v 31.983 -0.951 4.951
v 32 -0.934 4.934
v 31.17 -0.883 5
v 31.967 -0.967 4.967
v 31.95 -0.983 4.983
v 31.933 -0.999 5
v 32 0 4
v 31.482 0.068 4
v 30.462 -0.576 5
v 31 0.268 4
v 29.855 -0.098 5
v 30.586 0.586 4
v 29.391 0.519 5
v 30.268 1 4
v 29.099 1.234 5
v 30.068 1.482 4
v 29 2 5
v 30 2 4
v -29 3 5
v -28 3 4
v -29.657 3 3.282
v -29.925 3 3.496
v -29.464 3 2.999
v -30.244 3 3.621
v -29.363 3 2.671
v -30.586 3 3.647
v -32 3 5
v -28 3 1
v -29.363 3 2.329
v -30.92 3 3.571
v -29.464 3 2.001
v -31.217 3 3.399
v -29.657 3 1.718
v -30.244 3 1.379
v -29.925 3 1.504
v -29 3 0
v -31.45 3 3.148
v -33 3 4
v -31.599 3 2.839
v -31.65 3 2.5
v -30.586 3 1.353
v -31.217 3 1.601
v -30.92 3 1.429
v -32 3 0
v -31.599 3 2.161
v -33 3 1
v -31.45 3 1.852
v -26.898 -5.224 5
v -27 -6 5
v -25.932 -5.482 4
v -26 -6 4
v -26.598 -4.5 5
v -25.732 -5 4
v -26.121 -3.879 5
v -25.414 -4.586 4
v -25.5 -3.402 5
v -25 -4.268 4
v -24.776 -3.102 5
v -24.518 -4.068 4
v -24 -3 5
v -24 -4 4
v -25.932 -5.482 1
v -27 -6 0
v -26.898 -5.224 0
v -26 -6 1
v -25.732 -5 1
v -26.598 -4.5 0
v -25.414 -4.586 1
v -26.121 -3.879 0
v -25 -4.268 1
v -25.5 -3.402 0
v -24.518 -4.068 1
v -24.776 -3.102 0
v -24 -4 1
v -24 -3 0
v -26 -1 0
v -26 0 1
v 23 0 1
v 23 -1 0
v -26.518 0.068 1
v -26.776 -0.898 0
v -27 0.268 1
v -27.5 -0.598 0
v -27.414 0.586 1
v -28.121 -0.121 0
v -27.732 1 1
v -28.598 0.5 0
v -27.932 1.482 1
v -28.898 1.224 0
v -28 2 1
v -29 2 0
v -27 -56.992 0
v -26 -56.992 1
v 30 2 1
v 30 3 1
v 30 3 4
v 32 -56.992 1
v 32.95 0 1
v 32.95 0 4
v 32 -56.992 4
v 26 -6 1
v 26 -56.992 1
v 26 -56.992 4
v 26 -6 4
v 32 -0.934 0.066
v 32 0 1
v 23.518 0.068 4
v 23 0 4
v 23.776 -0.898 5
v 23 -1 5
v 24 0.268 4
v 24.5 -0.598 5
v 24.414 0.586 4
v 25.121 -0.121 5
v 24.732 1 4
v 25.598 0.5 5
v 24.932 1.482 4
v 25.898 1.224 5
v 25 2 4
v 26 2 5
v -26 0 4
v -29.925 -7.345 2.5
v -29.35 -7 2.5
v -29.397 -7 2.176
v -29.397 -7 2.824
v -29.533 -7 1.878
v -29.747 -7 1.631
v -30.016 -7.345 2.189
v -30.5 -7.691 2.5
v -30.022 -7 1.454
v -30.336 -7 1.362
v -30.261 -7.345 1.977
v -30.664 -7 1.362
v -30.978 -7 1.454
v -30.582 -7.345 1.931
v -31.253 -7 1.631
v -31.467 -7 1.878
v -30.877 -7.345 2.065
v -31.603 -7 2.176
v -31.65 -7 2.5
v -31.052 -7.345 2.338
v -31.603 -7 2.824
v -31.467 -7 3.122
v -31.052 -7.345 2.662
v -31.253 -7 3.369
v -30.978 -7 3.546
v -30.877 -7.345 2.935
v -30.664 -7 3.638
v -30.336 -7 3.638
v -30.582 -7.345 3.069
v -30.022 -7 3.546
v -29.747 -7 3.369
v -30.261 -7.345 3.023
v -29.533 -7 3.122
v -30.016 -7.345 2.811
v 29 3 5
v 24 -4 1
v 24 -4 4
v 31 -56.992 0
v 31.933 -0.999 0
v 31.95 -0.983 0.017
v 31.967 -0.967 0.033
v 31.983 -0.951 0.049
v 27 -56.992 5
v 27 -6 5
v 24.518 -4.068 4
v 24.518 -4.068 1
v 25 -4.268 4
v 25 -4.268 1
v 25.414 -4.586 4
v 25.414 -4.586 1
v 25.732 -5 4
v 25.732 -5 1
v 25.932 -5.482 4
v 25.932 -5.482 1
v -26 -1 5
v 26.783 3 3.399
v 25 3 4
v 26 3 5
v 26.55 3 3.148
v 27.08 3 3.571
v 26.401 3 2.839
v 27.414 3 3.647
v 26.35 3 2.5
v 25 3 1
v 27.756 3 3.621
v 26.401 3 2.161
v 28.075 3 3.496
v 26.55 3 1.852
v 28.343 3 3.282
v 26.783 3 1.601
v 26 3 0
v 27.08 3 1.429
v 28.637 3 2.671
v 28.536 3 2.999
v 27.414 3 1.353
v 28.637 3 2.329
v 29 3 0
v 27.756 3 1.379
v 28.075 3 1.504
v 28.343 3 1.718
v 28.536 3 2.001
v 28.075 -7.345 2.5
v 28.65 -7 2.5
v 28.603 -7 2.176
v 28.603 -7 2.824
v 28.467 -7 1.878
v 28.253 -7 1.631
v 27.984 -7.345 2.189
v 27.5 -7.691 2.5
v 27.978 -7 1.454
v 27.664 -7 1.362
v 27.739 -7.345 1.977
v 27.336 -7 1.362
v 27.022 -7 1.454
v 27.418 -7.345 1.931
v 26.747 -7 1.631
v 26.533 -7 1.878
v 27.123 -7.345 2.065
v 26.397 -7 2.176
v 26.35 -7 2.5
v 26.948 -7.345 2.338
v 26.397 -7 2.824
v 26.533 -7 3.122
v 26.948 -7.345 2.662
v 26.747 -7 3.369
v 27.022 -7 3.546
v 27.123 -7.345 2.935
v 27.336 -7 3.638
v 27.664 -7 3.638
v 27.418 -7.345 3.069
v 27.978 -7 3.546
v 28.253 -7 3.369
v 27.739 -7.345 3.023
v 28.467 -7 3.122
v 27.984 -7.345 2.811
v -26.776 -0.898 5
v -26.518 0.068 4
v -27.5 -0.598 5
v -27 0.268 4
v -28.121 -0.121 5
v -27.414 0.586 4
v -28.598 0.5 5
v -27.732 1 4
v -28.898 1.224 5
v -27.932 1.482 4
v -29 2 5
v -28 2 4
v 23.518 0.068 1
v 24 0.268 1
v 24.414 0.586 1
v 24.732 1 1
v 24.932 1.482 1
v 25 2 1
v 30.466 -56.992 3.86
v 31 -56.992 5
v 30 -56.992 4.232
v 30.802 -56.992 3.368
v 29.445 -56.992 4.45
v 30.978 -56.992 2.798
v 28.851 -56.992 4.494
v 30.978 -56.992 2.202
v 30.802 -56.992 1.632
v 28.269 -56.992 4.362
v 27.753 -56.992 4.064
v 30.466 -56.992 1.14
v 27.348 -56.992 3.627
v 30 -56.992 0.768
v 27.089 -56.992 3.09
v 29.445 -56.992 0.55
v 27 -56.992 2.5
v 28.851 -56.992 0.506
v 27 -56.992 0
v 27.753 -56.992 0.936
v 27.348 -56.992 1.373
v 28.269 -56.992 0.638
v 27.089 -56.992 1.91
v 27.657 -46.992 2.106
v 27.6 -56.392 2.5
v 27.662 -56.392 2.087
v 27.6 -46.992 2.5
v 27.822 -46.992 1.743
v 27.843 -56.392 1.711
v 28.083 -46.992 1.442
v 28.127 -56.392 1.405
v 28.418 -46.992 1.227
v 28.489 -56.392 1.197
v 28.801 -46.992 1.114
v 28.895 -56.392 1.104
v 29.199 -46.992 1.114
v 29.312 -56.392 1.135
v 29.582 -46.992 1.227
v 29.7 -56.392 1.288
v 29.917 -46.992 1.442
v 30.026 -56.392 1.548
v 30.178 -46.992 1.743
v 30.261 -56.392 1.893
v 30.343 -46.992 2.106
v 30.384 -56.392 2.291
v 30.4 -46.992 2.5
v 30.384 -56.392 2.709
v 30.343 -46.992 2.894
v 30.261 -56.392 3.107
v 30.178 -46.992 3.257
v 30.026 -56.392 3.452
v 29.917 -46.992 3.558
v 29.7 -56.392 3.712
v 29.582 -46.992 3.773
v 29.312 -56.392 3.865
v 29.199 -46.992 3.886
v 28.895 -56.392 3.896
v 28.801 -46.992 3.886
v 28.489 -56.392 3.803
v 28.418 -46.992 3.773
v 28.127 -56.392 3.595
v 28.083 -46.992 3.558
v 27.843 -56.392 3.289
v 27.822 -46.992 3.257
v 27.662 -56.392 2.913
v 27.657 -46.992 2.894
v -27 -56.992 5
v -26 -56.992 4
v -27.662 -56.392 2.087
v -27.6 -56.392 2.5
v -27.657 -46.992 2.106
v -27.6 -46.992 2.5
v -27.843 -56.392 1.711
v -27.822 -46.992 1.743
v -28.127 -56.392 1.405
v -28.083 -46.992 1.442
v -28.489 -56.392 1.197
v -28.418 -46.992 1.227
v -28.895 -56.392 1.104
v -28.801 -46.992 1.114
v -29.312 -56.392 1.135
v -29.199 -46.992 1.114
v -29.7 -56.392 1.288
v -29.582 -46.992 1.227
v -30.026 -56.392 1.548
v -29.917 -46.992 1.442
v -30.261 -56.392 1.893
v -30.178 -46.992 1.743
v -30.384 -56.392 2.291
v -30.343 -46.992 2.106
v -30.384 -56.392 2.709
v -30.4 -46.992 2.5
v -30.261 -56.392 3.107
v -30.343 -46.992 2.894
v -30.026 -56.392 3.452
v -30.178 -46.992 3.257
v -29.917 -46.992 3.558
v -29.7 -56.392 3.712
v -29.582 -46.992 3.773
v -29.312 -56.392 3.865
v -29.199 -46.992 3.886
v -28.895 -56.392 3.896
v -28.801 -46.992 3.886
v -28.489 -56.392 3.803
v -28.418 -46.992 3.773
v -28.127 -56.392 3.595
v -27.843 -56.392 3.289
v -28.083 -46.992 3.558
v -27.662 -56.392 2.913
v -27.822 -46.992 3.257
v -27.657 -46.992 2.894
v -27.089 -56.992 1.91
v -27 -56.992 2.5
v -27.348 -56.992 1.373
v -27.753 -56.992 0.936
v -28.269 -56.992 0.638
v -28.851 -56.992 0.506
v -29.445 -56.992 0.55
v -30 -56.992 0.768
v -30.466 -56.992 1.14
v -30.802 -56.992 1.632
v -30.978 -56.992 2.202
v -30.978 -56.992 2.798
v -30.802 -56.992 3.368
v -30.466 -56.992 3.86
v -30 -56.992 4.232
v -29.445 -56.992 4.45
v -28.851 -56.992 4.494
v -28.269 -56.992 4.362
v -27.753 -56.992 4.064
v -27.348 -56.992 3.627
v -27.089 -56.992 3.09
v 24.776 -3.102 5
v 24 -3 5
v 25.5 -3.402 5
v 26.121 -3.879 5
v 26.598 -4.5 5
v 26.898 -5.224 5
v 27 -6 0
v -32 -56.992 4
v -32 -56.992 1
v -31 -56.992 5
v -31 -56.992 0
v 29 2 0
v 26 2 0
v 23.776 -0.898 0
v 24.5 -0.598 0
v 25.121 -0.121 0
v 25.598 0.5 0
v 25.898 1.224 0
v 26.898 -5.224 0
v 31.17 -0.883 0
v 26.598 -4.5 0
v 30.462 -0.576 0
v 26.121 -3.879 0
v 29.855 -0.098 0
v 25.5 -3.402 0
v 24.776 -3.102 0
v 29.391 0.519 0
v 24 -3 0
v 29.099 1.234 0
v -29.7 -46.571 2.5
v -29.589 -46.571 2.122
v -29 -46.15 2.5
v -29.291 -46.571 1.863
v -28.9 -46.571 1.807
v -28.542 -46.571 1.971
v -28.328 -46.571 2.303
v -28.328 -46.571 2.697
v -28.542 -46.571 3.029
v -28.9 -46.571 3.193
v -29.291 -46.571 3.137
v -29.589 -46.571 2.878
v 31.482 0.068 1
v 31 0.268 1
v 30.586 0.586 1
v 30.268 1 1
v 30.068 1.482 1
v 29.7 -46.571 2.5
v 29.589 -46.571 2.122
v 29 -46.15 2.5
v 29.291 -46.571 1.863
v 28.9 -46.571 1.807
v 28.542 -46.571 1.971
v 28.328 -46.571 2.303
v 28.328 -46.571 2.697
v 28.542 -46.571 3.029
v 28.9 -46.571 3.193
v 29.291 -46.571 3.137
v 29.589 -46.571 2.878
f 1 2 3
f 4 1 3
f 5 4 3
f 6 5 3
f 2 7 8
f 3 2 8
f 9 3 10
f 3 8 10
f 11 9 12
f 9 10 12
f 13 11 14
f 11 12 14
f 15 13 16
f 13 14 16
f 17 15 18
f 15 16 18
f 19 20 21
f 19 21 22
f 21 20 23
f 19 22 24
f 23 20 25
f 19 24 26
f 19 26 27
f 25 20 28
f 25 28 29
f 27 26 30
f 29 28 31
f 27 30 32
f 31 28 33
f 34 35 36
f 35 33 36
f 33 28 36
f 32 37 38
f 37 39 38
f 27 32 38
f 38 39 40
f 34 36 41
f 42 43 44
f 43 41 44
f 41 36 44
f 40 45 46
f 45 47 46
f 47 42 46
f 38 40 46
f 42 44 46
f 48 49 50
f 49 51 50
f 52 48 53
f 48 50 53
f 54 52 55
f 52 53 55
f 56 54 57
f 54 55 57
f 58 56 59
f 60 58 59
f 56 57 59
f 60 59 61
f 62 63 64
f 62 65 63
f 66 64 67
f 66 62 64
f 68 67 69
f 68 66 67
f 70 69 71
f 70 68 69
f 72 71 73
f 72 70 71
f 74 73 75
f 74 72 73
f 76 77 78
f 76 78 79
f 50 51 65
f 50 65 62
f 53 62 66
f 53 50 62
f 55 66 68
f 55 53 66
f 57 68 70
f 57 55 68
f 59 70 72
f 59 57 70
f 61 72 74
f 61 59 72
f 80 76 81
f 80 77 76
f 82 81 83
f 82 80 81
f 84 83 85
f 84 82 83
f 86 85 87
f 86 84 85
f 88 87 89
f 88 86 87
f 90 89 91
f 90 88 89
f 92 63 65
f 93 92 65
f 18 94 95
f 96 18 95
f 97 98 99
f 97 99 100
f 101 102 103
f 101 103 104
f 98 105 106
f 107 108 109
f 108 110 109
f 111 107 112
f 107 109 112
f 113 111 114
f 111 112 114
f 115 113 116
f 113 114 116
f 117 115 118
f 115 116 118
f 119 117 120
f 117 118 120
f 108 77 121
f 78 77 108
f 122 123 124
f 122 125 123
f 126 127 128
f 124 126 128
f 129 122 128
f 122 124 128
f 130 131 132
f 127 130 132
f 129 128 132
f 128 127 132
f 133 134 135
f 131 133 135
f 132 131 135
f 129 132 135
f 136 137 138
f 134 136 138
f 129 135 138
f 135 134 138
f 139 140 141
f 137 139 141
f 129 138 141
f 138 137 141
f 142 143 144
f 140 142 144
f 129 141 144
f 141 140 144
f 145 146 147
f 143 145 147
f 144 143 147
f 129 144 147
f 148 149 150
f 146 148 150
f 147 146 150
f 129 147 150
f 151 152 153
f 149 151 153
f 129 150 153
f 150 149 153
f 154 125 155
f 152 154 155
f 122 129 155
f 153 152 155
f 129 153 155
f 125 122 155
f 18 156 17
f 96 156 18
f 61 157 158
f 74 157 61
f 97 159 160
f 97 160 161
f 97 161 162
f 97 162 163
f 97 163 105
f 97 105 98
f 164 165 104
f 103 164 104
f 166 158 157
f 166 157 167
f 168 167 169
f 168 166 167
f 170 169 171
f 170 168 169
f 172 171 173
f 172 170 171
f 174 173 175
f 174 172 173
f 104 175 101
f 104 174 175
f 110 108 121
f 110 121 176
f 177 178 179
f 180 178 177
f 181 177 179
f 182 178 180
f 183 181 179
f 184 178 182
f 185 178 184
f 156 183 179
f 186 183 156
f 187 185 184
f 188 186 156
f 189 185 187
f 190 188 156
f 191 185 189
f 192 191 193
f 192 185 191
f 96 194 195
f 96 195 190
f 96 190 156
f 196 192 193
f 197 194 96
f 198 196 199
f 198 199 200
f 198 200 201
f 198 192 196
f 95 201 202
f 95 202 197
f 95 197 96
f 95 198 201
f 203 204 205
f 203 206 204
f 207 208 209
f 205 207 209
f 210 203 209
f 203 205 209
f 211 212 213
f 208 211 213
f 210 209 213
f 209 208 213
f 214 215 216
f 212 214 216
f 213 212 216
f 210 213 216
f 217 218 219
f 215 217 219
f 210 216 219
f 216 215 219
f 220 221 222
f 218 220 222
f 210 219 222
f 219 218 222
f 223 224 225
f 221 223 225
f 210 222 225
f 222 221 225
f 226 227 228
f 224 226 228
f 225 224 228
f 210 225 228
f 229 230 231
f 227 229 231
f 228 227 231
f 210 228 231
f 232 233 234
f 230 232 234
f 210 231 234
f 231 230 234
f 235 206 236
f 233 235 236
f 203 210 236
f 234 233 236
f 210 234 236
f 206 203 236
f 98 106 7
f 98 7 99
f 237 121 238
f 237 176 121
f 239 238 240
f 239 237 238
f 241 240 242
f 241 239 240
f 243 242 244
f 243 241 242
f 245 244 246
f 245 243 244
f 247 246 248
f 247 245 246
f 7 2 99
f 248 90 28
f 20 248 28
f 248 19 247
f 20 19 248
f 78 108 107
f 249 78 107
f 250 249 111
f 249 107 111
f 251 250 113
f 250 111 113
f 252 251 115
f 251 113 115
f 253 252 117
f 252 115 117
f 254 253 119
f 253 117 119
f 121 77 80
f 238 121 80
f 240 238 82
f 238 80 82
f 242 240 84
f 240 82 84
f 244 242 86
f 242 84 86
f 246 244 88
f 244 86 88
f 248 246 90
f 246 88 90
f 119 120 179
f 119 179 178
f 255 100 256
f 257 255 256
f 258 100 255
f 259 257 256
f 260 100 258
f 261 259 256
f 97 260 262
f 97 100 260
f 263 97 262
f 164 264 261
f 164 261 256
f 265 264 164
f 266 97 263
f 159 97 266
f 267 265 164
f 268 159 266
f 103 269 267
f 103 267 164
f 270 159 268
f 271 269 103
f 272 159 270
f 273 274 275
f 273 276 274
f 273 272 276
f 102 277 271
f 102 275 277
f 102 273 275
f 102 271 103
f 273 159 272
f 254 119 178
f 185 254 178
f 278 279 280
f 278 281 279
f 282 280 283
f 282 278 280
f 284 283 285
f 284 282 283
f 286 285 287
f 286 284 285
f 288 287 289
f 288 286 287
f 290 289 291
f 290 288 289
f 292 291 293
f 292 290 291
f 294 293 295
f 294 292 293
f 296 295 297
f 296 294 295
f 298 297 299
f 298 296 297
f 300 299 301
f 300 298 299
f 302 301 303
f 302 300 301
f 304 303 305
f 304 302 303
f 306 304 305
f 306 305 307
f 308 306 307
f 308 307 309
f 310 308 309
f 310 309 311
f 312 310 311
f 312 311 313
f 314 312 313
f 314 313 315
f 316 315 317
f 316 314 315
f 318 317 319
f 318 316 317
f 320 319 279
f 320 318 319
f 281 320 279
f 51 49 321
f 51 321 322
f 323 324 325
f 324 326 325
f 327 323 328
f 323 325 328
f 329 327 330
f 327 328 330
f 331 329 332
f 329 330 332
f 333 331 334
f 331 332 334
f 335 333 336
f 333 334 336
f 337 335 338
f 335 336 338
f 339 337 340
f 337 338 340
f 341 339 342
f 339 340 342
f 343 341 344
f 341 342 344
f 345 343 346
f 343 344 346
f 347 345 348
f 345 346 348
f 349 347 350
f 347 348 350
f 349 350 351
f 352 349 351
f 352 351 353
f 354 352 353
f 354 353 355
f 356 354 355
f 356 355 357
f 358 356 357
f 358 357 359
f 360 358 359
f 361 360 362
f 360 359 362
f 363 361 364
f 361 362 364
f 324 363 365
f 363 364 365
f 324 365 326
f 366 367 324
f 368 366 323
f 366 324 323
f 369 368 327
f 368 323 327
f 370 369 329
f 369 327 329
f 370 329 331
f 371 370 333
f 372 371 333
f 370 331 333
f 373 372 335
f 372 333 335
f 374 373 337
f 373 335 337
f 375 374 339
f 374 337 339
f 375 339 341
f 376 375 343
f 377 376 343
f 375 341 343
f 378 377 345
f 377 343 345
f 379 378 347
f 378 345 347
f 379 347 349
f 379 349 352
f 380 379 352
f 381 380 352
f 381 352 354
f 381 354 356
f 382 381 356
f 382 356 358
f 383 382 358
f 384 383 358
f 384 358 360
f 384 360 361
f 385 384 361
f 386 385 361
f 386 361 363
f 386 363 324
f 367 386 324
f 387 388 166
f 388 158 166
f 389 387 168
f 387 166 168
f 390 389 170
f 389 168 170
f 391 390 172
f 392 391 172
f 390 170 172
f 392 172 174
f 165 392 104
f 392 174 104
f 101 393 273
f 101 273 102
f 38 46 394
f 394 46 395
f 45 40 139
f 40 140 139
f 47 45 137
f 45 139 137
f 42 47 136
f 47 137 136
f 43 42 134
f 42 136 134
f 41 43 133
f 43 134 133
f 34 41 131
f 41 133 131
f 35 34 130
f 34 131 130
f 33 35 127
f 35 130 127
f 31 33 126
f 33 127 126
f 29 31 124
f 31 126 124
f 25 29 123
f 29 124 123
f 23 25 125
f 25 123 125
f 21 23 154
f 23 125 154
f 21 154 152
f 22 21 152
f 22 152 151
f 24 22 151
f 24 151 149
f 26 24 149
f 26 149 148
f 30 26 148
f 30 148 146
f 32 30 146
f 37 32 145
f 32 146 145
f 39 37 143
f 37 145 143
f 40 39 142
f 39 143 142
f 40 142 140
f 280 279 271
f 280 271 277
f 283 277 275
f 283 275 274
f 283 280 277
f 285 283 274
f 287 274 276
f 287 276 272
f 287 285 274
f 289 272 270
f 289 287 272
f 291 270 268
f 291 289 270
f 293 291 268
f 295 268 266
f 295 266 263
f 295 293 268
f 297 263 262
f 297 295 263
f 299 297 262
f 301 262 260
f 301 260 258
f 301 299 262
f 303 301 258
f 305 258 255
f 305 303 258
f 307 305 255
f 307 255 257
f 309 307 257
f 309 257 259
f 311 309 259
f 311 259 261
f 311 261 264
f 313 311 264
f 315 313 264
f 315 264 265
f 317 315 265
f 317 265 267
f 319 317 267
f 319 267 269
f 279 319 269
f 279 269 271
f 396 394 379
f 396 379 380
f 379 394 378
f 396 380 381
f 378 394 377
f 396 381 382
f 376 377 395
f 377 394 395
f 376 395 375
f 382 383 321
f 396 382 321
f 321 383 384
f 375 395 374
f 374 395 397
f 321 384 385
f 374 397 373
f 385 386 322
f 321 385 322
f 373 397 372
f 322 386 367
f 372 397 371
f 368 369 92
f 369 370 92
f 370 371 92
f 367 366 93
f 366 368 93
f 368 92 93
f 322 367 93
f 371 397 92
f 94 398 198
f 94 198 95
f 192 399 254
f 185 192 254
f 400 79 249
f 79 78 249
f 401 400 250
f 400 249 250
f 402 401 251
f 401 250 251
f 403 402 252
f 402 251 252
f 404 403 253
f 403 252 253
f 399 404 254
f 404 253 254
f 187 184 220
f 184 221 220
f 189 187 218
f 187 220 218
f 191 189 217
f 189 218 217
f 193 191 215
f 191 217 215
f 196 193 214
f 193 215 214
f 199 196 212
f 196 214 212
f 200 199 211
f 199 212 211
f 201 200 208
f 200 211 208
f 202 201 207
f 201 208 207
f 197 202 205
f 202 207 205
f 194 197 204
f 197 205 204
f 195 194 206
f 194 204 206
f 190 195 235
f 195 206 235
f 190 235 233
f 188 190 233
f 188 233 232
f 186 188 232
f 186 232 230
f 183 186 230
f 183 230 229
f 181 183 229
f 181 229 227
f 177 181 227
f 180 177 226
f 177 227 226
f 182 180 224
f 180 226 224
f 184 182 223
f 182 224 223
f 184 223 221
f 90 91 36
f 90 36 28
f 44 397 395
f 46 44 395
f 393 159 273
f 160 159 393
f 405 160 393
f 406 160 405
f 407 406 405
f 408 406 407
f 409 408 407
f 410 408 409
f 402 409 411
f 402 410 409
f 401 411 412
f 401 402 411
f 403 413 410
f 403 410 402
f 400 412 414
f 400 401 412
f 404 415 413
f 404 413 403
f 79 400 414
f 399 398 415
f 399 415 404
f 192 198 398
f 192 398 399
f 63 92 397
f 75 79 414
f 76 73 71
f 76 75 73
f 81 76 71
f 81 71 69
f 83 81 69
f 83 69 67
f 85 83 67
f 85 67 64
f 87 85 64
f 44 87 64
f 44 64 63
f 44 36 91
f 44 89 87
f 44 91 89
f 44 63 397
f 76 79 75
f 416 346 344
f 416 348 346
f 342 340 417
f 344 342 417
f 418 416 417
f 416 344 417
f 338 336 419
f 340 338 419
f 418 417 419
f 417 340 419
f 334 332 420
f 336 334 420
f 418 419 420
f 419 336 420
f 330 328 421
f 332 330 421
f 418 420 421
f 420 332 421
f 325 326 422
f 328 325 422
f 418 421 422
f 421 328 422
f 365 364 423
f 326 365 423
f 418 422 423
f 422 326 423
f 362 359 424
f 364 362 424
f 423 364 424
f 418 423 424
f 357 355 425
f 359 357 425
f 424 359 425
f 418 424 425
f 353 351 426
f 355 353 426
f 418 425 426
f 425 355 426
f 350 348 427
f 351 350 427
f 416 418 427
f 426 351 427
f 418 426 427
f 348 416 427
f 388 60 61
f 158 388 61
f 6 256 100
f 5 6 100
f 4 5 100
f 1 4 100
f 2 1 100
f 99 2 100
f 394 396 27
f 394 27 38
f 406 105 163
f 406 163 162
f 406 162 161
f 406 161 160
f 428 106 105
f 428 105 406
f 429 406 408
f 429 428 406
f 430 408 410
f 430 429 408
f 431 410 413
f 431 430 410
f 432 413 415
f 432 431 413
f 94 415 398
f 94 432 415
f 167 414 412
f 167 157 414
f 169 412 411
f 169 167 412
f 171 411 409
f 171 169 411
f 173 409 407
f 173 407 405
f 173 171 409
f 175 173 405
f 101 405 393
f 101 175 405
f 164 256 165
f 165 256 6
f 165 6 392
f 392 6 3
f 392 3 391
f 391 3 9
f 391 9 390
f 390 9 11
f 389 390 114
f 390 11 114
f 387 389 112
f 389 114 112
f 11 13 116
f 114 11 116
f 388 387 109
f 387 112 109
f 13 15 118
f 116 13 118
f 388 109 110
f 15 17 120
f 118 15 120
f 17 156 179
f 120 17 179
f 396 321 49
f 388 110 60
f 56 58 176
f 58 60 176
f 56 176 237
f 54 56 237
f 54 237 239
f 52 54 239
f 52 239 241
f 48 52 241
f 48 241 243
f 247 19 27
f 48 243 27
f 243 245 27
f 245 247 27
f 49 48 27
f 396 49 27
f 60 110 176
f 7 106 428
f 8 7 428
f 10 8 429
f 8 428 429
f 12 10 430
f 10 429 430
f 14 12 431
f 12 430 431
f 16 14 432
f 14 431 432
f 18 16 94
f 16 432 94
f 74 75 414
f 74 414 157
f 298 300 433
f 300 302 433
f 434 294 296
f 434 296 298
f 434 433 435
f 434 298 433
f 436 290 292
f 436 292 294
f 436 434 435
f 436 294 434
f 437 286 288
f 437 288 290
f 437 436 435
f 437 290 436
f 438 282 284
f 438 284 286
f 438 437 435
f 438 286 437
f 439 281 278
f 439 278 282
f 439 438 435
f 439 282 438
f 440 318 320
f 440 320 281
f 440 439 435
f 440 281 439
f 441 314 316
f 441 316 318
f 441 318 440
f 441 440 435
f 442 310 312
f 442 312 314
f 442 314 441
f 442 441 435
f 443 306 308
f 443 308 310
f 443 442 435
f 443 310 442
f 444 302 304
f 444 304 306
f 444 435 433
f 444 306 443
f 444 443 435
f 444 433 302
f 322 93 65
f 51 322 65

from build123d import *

# Parameters (mm, degrees)
BOSS_EXTRUDE1_DEPTH             = 5
F_3_0MM_DOWEL_HOLE1_D           = 2.8
F_3_0MM_DOWEL_HOLE1_DEPTH       = 10
F_3_0MM_DOWEL_HOLE1_CSINK_D     = 4
F_3_0MM_DOWEL_HOLE1_CSINK_ANGLE = 90
F_3_0MM_DOWEL_HOLE1_TIP         = 0.841204867
F_2_5MM_DOWEL_HOLE1_D           = 2.3
F_2_5MM_DOWEL_HOLE1_DEPTH       = 10
F_2_5MM_DOWEL_HOLE1_TIP         = 0.690989712
CUT_EXTRUDE1_REACH              = 68.046
SKETCH6_W                       = 3
SKETCH6_H                       = 3
FILLET2_R                       = 2
CHAMFER1_SIZE                   = 1


with BuildPart() as part:
    # Sketch1 → Boss-Extrude1 (new body)
    with BuildSketch(Plane.XY):
        Polygon((0, 0), (-25, 0), (-25, 3), (-33, 3), (-32, -56.991666088), (-26, -56.991666088), (-26, -4), (0, -4), align=None)
    extrude(amount=BOSS_EXTRUDE1_DEPTH)

    # Ø3.0mm Dowel Hole1
    with Locations(Plane(origin=(0, -56.991666088, 0), x_dir=(-1, 0, 0), z_dir=(0, -1, 0))):
        with Locations((29, -2.5)):
            CounterSinkHole(F_3_0MM_DOWEL_HOLE1_D / 2, F_3_0MM_DOWEL_HOLE1_CSINK_D / 2, depth=F_3_0MM_DOWEL_HOLE1_DEPTH, counter_sink_angle=F_3_0MM_DOWEL_HOLE1_CSINK_ANGLE)
            with Locations((0, 0, -(F_3_0MM_DOWEL_HOLE1_DEPTH + F_3_0MM_DOWEL_HOLE1_TIP / 2))):  # 118° drill point
                Cone(0, F_3_0MM_DOWEL_HOLE1_D / 2, F_3_0MM_DOWEL_HOLE1_TIP, mode=Mode.SUBTRACT)

    # Mirror1: part across plane


with BuildPart() as part_1:
    add(part.part)
    add(part.part.mirror(Plane(origin=(0, -4, 5), x_dir=(0, 0, 1), z_dir=(-1, 0, 0))))

    # Ø2.5mm Dowel Hole1
    with Locations(Plane(origin=(0, 3, 0), x_dir=(1, 0, 0), z_dir=(0, 1, 0))):
        with Locations((-30.5, -2.5), (27.5, -2.5)):
            Hole(F_2_5MM_DOWEL_HOLE1_D / 2, depth=F_2_5MM_DOWEL_HOLE1_DEPTH)
            with Locations((0, 0, -(F_2_5MM_DOWEL_HOLE1_DEPTH + F_2_5MM_DOWEL_HOLE1_TIP / 2))):  # 118° drill point
                Cone(0, F_2_5MM_DOWEL_HOLE1_D / 2, F_2_5MM_DOWEL_HOLE1_TIP, mode=Mode.SUBTRACT)

    # Sketch6 → Cut-Extrude1 (cut, up to next)
    with BuildSketch(Plane.XY.offset(5), mode=Mode.PRIVATE) as cut_extrude1_sk1:
        with Locations((-26.5, 1.5)):
            Rectangle(SKETCH6_W, SKETCH6_H)
    cut_extrude1_tool1 = extrude(cut_extrude1_sk1.sketch, amount=-CUT_EXTRUDE1_REACH, mode=Mode.PRIVATE) & part_1.part
    # Sketch6 → Cut-Extrude1 (cut, up to next)
    with BuildSketch(Plane.XY.offset(5), mode=Mode.PRIVATE) as cut_extrude1_sk2:
        with Locations((31.5, 1.5)):
            Rectangle(SKETCH6_W, SKETCH6_H)
    cut_extrude1_tool2 = extrude(cut_extrude1_sk2.sketch, amount=-CUT_EXTRUDE1_REACH, mode=Mode.PRIVATE) & part_1.part
    add(cut_extrude1_tool1.solids().sort_by_distance((-26.5, 1.5, 5))[0], mode=Mode.SUBTRACT)
    add(cut_extrude1_tool2.solids().sort_by_distance((31.5, 1.5, 5))[0], mode=Mode.SUBTRACT)

    # Fillet2
    fillet2_edges = [part_1.edges().sort_by_distance(p)[0] for p in [
        (-26, -4, 2.5),
        (25, 0, 2.5),
        (26, -4, 2.5),
        (-28, 0, 2.5),
        (30, 0, 2.5),
    ]]
    fillet(fillet2_edges, radius=FILLET2_R)

    # Chamfer1
    # the kernel refuses this chamfer: 1 mm, written as the material it takes off along each edge
    with BuildSketch(Plane(origin=(32, 2, 5), x_dir=(0, -1, 0), z_dir=(1, 0, 0))) as chamfer1_piece_1:
        Polygon((2 + CHAMFER1_SIZE, 0), (2, CHAMFER1_SIZE), (2, 0), align=None)
    revolve(axis=Axis((32, 2, 5), (0, 0, -1)), revolution_arc=90, mode=Mode.SUBTRACT)
    with BuildSketch(Plane(origin=(32, 2, 0), x_dir=(0, -1, 0), z_dir=(1, 0, 0))) as chamfer1_piece_2:
        Polygon((2 + CHAMFER1_SIZE, 0), (2, -CHAMFER1_SIZE), (2, 0), align=None)
    revolve(axis=Axis((32, 2, 0), (0, 0, -1)), revolution_arc=90, mode=Mode.SUBTRACT)
    with BuildSketch(Plane(origin=(-26, 2, 5), x_dir=(0, -1, 0), z_dir=(1, 0, 0))) as chamfer1_piece_3:
        Polygon((2, CHAMFER1_SIZE), (2 + CHAMFER1_SIZE, 0), (2, 0), align=None)
    revolve(axis=Axis((-26, 2, 5), (0, 0, -1)), revolution_arc=90, mode=Mode.SUBTRACT)
    with BuildSketch(Plane(origin=(-26, 2, 0), x_dir=(0, -1, 0), z_dir=(1, 0, 0))) as chamfer1_piece_4:
        Polygon((2 + CHAMFER1_SIZE, 0), (2, -CHAMFER1_SIZE), (2, 0), align=None)
    revolve(axis=Axis((-26, 2, 0), (0, 0, -1)), revolution_arc=90, mode=Mode.SUBTRACT)
    with BuildSketch(Plane(origin=(24, -6, 0), x_dir=(0, 1, 0), z_dir=(-1, 0, 0))) as chamfer1_piece_5:
        Polygon((2 + CHAMFER1_SIZE, 0), (2, -CHAMFER1_SIZE), (2, 0), align=None)
    revolve(axis=Axis((24, -6, 0), (0, 0, -1)), revolution_arc=90, mode=Mode.SUBTRACT)
    with BuildSketch(Plane(origin=(24, -6, 5), x_dir=(0, 1, 0), z_dir=(-1, 0, 0))) as chamfer1_piece_6:
        Polygon((2 + CHAMFER1_SIZE, 0), (2, CHAMFER1_SIZE), (2, 0), align=None)
    revolve(axis=Axis((24, -6, 5), (0, 0, -1)), revolution_arc=90, mode=Mode.SUBTRACT)
    with BuildSketch(Plane(origin=(-24, -6, 0), x_dir=(-1, 0, 0), z_dir=(0, -1, 0))) as chamfer1_piece_7:
        Polygon((2 + CHAMFER1_SIZE, 0), (2, -CHAMFER1_SIZE), (2, 0), align=None)
    revolve(axis=Axis((-24, -6, 0), (0, 0, -1)), revolution_arc=90, mode=Mode.SUBTRACT)
    with BuildSketch(Plane(origin=(-24, -6, 5), x_dir=(-1, 0, 0), z_dir=(0, -1, 0))) as chamfer1_piece_8:
        Polygon((2 + CHAMFER1_SIZE, 0), (2, CHAMFER1_SIZE), (2, 0), align=None)
    revolve(axis=Axis((-24, -6, 5), (0, 0, -1)), revolution_arc=90, mode=Mode.SUBTRACT)
    with BuildSketch(Plane(origin=(23, 2, 0), x_dir=(0, -1, 0), z_dir=(-1, 0, 0))) as chamfer1_piece_9:
        Polygon((2 + CHAMFER1_SIZE, 0), (2, CHAMFER1_SIZE), (2, 0), align=None)
    revolve(axis=Axis((23, 2, 0), (0, 0, 1)), revolution_arc=90, mode=Mode.SUBTRACT)
    with BuildSketch(Plane(origin=(23, 2, 5), x_dir=(0, -1, 0), z_dir=(-1, 0, 0))) as chamfer1_piece_10:
        Polygon((2, -CHAMFER1_SIZE), (2 + CHAMFER1_SIZE, 0), (2, 0), align=None)
    revolve(axis=Axis((23, 2, 5), (0, 0, 1)), revolution_arc=90, mode=Mode.SUBTRACT)
    with BuildSketch(Plane(origin=(-33.042861383, 5.571325785, 5), x_dir=(0.9994830708911936, 0.016660365281854946, 0.027495876610586452), z_dir=(0.01666666666666667, -0.9998611014647096, 0))) as chamfer1_piece_11:
        Polygon((CHAMFER1_SIZE * 0.999621916911, -CHAMFER1_SIZE * 0.0274958766106), (-CHAMFER1_SIZE * 0.0274958766106, -CHAMFER1_SIZE * 0.999621916911), (0, 0), align=None)
    extrude(amount=65.143365976, mode=Mode.SUBTRACT)
    with BuildSketch(Plane(origin=(-26, -59.563349076, 5), x_dir=(-0.9996219169112968, 0, 0.02749587661058651), z_dir=(0, 1, 0)), Plane(origin=(26, -59.563349076, 0), x_dir=(0.9996219169112968, 0, -0.02749587661058634), z_dir=(0, 1, 0))) as chamfer1_piece_12:
        Polygon((CHAMFER1_SIZE * 0.999621916911, -CHAMFER1_SIZE * 0.0274958766106), (-CHAMFER1_SIZE * 0.0274958766106, -CHAMFER1_SIZE * 0.999621916911), (0, 0), align=None)
    extrude(amount=53.563349076, mode=Mode.SUBTRACT)
    with BuildSketch(Plane(origin=(26, -59.563349076, 5), x_dir=(0.9996219169112968, 0, 0.02749587661058651), z_dir=(0, 1, 0)), Plane(origin=(-26, -59.563349076, 0), x_dir=(-0.9996219169112968, 0, -0.02749587661058639), z_dir=(0, 1, 0))) as chamfer1_piece_13:
        Polygon((CHAMFER1_SIZE * 0.999621916911, CHAMFER1_SIZE * 0.0274958766106), (-CHAMFER1_SIZE * 0.0274958766106, CHAMFER1_SIZE * 0.999621916911), (0, 0), align=None)
    extrude(amount=53.563349076, mode=Mode.SUBTRACT)
    with BuildSketch(Plane(origin=(32.992854437, 2.571325785, 0), x_dir=(-0.9994830708911936, 0.016660365281854946, -0.02749587661058633), z_dir=(-0.01666666666666667, -0.9998611014647096, 0))) as chamfer1_piece_14:
        Polygon((CHAMFER1_SIZE * 0.999621916911, -CHAMFER1_SIZE * 0.0274958766106), (-CHAMFER1_SIZE * 0.0274958766106, -CHAMFER1_SIZE * 0.999621916911), (0, 0), align=None)
    extrude(amount=62.142949222, mode=Mode.SUBTRACT)
    with BuildSketch(Plane(origin=(32.992854437, 2.571325785, 5), x_dir=(-0.9994830708911936, 0.016660365281854946, 0.027495876610586452), z_dir=(-0.01666666666666667, -0.9998611014647096, 0))) as chamfer1_piece_15:
        Polygon((CHAMFER1_SIZE * 0.999621916911, CHAMFER1_SIZE * 0.0274958766106), (-CHAMFER1_SIZE * 0.0274958766106, CHAMFER1_SIZE * 0.999621916911), (0, 0), align=None)
    extrude(amount=62.142949222, mode=Mode.SUBTRACT)
    with BuildSketch(Plane(origin=(-28, 5.571682988, 5), x_dir=(-0.9996219169112968, 0, 0.02749587661058651), z_dir=(0, -1, 0)), Plane(origin=(30, 5.571682988, 5), x_dir=(-0.9996219169112968, 0, 0.02749587661058651), z_dir=(0, -1, 0)), Plane(origin=(30, 2, 0), x_dir=(-0.9996219169112968, 0, -0.02749587661058634), z_dir=(0, 1, 0)), Plane(origin=(-28, 2, 0), x_dir=(-0.9996219169112968, 0, -0.02749587661058639), z_dir=(0, 1, 0)), Plane(origin=(25, 2, 5), x_dir=(0.9996219169112968, 0, 0.027495876610586605), z_dir=(0, 1, 0))) as chamfer1_piece_16:
        Polygon((CHAMFER1_SIZE * 0.999621916911, CHAMFER1_SIZE * 0.0274958766106), (-CHAMFER1_SIZE * 0.0274958766106, CHAMFER1_SIZE * 0.999621916911), (0, 0), align=None)
    extrude(amount=3.571682988, mode=Mode.SUBTRACT)
    with BuildSketch(Plane(origin=(-33.042861383, 5.571325785, 0), x_dir=(0.9994830708911936, 0.016660365281854946, -0.02749587661058633), z_dir=(0.01666666666666667, -0.9998611014647096, 0))) as chamfer1_piece_17:
        Polygon((CHAMFER1_SIZE * 0.999621916911, CHAMFER1_SIZE * 0.0274958766106), (-CHAMFER1_SIZE * 0.0274958766106, CHAMFER1_SIZE * 0.999621916911), (0, 0), align=None)
    extrude(amount=65.143365976, mode=Mode.SUBTRACT)
    with BuildSketch(Plane(origin=(23, 0, 0), x_dir=(0, 0.02749587661059217, 0.9996219169112965), z_dir=(-1, 0, 0)), Plane(origin=(-26, 0, 5), x_dir=(0, 0.027495876610583284, -0.9996219169112968), z_dir=(1, 0, 0))) as chamfer1_piece_18:
        Polygon((CHAMFER1_SIZE * 0.999621916911, -CHAMFER1_SIZE * 0.0274958766106), (-CHAMFER1_SIZE * 0.0274958766106, -CHAMFER1_SIZE * 0.999621916911), (0, 0), align=None)
    extrude(amount=49, mode=Mode.SUBTRACT)
    with BuildSketch(Plane(origin=(24, -4, 0), x_dir=(0, 0.9996219169112968, -0.027495876610586365), z_dir=(-1, 0, 0)), Plane(origin=(-24, -4, 5), x_dir=(0, 0.9996219169112968, 0.027495876610586487), z_dir=(1, 0, 0))) as chamfer1_piece_19:
        Polygon((CHAMFER1_SIZE * 0.999621916911, -CHAMFER1_SIZE * 0.0274958766106), (-CHAMFER1_SIZE * 0.0274958766106, -CHAMFER1_SIZE * 0.999621916911), (0, 0), align=None)
    extrude(amount=48, mode=Mode.SUBTRACT)
    with BuildSketch(Plane(origin=(25, 2, 0), x_dir=(0.9996219169112968, 0, -0.02749587661058654), z_dir=(0, 1, 0))) as chamfer1_piece_20:
        Polygon((CHAMFER1_SIZE * 0.999621916911, -CHAMFER1_SIZE * 0.0274958766106), (-CHAMFER1_SIZE * 0.0274958766106, -CHAMFER1_SIZE * 0.999621916911), (0, 0), align=None)
    extrude(amount=3.571682988, mode=Mode.SUBTRACT)
    with BuildSketch(Plane(origin=(35.521676042, 0, 0), x_dir=(0, -0.9996219169112968, -0.027495876610586365), z_dir=(-1, 0, 0)), Plane(origin=(32, 0, 5), x_dir=(0, -0.9996219169112968, 0.027495876610586497), z_dir=(1, 0, 0))) as chamfer1_piece_21:
        Polygon((CHAMFER1_SIZE * 0.999621916911, CHAMFER1_SIZE * 0.0274958766106), (-CHAMFER1_SIZE * 0.0274958766106, CHAMFER1_SIZE * 0.999621916911), (0, 0), align=None)
    extrude(amount=3.521676042, mode=Mode.SUBTRACT)


solid = part_1.part
